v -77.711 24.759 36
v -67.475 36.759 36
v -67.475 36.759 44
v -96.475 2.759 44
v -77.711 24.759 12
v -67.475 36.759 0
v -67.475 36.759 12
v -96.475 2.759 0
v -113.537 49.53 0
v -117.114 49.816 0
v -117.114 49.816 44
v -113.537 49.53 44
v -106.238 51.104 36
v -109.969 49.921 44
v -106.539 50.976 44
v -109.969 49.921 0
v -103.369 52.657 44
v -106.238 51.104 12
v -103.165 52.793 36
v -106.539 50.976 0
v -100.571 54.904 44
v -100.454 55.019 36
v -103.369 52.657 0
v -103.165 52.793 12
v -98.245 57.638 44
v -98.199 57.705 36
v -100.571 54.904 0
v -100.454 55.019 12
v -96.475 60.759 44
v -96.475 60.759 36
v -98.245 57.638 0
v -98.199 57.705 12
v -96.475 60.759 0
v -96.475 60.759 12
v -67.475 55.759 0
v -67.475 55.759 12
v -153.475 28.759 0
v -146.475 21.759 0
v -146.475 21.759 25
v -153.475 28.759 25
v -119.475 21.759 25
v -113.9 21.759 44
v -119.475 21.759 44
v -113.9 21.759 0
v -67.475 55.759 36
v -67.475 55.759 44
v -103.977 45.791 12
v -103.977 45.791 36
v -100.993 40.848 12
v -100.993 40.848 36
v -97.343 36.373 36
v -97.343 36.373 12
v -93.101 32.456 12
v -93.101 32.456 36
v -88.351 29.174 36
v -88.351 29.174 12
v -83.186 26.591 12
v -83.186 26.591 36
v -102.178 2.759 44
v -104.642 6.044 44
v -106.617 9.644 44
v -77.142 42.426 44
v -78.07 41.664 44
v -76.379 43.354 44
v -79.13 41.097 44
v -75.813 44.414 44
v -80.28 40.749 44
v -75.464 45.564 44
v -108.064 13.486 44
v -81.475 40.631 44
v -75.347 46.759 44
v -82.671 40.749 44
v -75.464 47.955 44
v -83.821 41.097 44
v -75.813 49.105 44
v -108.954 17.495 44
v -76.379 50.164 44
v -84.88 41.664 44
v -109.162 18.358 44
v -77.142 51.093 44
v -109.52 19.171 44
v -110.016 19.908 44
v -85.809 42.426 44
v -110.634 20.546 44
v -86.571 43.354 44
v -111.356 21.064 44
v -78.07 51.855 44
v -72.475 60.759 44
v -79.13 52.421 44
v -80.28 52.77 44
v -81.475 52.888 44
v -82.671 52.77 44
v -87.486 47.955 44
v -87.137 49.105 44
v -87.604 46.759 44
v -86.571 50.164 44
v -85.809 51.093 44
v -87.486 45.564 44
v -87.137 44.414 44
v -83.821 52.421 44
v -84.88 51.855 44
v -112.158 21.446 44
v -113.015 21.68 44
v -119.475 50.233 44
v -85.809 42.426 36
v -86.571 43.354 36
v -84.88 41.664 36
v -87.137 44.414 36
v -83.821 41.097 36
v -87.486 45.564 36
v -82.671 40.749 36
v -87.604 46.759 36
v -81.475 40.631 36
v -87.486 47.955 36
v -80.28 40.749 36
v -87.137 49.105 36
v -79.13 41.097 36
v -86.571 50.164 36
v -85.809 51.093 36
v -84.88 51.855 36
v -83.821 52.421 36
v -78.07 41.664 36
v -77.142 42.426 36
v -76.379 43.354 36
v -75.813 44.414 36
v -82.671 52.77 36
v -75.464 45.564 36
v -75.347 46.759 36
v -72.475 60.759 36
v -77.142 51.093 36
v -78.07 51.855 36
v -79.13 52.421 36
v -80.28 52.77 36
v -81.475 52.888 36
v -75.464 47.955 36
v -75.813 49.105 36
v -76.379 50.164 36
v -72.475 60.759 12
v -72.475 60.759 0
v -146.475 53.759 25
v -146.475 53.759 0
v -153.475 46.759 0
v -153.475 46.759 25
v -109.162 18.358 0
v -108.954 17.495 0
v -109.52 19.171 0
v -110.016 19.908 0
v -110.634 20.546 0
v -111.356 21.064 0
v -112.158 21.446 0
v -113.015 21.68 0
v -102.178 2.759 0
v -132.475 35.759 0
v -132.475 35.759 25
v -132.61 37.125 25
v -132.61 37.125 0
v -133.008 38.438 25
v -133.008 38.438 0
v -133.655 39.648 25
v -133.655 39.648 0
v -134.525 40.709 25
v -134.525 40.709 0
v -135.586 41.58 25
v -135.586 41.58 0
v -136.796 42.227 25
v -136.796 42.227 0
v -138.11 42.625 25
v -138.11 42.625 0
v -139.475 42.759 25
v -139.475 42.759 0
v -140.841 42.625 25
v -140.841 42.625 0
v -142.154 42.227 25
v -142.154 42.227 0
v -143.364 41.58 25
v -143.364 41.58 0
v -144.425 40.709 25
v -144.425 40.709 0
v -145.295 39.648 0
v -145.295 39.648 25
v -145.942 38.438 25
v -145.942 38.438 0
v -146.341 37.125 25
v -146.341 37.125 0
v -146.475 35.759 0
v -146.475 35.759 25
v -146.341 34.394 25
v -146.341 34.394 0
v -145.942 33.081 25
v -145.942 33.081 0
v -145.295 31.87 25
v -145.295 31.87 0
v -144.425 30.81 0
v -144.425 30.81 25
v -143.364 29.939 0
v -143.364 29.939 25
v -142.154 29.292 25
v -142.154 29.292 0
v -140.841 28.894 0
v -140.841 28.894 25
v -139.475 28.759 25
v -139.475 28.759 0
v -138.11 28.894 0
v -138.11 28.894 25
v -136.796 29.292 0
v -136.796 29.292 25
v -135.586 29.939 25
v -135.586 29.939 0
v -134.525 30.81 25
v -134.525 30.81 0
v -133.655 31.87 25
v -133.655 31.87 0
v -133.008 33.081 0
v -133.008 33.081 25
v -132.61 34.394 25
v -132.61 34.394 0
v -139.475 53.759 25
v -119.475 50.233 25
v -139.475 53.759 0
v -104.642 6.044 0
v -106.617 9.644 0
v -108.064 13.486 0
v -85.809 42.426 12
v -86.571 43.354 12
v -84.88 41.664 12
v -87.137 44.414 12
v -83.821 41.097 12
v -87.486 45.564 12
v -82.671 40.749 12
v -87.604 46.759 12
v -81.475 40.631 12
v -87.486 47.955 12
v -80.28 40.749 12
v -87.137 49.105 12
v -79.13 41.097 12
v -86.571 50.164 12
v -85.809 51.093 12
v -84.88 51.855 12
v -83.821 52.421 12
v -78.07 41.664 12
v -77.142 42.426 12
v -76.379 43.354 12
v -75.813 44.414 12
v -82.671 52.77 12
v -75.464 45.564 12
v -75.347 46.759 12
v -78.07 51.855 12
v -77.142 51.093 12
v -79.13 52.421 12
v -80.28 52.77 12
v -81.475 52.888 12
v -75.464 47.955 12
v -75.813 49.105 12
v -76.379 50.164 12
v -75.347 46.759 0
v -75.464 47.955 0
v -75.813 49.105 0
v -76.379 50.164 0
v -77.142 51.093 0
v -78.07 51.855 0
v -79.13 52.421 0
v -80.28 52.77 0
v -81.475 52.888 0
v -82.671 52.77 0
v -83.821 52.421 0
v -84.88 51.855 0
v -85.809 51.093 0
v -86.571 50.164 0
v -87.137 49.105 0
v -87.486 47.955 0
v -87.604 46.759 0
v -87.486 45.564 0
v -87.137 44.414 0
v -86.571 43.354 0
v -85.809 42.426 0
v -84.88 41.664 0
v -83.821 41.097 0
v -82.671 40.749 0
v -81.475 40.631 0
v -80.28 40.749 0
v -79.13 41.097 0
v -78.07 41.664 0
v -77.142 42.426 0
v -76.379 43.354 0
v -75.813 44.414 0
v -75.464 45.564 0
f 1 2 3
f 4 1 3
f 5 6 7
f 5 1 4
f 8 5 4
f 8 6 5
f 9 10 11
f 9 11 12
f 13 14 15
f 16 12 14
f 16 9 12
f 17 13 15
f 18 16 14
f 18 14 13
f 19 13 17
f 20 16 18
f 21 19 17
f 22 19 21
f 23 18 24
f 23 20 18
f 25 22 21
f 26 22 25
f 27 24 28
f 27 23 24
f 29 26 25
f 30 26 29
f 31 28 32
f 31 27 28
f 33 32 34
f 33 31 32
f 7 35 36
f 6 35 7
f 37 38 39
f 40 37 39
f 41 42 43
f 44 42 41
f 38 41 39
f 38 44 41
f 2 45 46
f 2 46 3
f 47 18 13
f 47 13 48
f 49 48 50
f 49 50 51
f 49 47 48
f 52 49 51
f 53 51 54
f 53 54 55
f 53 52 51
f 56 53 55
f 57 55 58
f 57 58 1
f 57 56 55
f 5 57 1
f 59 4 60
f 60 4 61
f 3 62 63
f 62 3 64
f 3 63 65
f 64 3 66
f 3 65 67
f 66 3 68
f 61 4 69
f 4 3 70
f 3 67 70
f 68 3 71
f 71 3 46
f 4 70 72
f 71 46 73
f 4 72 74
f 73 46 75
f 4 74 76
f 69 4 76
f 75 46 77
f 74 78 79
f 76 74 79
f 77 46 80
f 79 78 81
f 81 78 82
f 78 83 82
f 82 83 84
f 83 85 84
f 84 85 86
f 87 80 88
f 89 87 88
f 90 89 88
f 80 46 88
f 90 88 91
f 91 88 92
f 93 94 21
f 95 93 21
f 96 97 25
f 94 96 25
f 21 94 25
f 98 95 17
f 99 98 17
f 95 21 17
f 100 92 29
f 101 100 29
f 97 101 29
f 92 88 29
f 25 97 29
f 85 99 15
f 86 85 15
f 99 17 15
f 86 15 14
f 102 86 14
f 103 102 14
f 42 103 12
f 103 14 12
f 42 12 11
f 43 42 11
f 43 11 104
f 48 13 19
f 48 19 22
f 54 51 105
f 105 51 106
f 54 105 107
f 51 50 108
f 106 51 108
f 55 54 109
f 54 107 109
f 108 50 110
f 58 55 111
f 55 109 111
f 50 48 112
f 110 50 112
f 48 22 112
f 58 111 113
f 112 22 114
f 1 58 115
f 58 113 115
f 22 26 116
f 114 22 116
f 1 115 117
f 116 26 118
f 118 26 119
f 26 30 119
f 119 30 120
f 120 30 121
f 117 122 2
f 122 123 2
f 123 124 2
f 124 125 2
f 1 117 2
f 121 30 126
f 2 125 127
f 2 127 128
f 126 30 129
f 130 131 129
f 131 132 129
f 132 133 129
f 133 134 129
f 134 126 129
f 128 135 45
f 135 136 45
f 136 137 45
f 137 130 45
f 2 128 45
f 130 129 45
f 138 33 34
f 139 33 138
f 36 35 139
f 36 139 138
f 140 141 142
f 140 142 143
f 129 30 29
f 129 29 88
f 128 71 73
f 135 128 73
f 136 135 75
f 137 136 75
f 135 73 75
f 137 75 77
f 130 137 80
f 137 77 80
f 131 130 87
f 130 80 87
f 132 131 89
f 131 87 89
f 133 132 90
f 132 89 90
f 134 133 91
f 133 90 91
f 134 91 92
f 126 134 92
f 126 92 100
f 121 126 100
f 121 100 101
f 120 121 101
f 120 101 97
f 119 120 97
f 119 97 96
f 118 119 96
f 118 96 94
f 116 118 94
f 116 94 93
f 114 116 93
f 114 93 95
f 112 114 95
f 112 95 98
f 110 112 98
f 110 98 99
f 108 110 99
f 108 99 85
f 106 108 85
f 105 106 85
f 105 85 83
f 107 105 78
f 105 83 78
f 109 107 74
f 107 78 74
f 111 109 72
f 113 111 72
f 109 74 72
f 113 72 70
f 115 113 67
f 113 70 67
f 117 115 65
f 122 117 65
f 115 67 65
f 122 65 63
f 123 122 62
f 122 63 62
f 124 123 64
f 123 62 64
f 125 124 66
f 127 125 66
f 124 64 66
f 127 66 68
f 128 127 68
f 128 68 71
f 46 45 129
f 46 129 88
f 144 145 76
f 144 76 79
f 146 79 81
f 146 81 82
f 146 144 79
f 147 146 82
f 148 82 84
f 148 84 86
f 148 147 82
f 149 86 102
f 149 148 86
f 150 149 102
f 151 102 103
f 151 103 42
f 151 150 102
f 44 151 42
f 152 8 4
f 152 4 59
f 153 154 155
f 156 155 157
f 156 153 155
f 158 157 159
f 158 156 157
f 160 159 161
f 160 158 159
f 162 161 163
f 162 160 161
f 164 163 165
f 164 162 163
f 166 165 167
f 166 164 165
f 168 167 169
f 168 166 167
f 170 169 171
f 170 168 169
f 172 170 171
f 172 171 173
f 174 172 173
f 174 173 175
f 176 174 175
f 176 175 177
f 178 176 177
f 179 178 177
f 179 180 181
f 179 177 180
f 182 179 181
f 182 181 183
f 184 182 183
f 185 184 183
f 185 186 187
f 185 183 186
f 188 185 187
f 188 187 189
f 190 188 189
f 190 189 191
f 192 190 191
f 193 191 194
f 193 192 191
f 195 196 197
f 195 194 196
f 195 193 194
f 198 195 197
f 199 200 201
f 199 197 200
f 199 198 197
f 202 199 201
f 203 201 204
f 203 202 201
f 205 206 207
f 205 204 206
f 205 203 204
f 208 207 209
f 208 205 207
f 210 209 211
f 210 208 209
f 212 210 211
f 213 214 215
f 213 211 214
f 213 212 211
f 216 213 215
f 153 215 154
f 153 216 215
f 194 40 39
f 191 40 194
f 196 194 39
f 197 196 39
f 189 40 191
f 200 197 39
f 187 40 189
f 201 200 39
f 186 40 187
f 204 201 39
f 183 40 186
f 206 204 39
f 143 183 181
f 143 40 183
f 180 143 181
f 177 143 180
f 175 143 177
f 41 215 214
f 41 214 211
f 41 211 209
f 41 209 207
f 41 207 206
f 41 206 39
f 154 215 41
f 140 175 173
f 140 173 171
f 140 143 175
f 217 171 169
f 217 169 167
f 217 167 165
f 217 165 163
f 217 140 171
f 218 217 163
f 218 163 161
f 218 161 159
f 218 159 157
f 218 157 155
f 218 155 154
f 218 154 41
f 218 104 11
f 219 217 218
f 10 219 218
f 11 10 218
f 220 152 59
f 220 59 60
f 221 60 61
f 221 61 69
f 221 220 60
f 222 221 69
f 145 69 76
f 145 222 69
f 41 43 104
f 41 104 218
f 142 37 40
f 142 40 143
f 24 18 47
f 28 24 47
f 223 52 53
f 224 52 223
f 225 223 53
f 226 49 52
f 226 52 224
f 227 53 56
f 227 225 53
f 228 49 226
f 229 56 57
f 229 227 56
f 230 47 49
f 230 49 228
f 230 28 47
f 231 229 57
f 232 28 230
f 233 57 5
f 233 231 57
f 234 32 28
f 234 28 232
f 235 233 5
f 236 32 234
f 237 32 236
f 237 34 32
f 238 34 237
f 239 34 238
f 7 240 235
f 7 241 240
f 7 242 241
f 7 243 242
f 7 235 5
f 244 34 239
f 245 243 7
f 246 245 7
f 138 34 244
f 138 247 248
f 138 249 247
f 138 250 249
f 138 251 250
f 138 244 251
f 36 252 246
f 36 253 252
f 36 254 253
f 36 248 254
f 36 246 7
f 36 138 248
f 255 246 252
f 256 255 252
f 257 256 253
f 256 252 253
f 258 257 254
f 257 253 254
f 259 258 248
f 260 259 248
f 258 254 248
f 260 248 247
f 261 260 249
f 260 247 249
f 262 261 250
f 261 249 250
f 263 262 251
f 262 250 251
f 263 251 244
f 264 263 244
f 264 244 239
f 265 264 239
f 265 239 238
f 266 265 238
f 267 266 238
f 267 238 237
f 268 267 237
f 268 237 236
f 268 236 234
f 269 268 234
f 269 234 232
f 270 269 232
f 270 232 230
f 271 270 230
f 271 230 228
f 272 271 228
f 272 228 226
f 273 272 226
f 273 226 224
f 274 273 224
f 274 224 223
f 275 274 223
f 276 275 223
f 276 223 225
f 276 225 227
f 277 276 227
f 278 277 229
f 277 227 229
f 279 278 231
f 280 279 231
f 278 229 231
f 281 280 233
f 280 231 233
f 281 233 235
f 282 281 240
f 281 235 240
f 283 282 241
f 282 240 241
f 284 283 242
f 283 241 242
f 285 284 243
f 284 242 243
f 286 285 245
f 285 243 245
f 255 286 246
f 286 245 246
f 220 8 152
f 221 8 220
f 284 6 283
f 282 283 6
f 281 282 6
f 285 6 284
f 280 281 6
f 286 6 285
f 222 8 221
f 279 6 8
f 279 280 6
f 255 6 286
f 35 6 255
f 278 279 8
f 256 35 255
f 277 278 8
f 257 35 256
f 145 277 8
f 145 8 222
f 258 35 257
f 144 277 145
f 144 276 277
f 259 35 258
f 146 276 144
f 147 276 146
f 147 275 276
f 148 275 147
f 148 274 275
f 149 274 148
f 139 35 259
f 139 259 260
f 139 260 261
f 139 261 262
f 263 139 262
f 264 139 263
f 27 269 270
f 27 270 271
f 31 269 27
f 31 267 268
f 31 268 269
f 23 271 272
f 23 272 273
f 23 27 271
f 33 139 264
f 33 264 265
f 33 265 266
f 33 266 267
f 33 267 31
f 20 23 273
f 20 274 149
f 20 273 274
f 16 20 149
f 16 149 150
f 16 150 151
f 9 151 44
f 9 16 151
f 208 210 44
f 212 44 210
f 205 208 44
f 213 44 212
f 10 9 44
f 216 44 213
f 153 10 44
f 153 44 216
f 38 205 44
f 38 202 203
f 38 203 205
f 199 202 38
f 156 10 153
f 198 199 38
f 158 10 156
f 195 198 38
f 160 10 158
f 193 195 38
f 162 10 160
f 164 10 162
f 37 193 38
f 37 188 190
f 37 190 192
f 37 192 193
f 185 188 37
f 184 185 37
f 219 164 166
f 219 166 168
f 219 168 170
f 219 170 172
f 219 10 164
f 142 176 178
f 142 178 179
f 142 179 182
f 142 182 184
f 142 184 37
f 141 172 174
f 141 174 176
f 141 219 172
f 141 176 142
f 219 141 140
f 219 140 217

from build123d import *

# Parameters (mm, degrees)
BOSS_EXTRUDE1_DEPTH = 44
SKETCH5_R           = 7
CUT_EXTRUDE1_DEPTH  = 171.828393793
CHAMFER1_SIZE       = 7
CHAMFER2_SIZE       = 7
CHAMFER3_SIZE       = 5
SKETCH8_R           = 6.128605104
CUT_EXTRUDE2_DEPTH  = 171.828393793
SKETCH9_W           = 34
SKETCH9_H           = 19
CUT_EXTRUDE3_DEPTH  = 168.605610181
CUT_EXTRUDE4_START  = -12
CUT_EXTRUDE4_DEPTH  = 24


with BuildPart() as part:
    # Sketch4 → Boss-Extrude1 (new body)
    with BuildSketch(Plane.XY):
        with BuildLine():
            Line((-153.475211562, 21.759357812), (-153.475211562, 53.759357812))
            Line((-153.475211562, 53.759357812), (-139.475211562, 53.759357812))
            Line((-139.475211562, 53.759357812), (-117.113830726, 49.816443045))
            ThreePointArc((-117.113830726, 49.816443045), (-104.914112856, 51.741401954), (-96.475211562, 60.759357812))
            Line((-96.475211562, 60.759357812), (-67.475211562, 60.759357812))
            Line((-67.475211562, 60.759357812), (-67.475211562, 36.759357812))
            Line((-67.475211562, 36.759357812), (-96.475211562, 2.759357812))
            Line((-96.475211562, 2.759357812), (-102.178231509, 2.759357812))
            ThreePointArc((-102.178231509, 2.759357812), (-106.617203706, 9.643685751), (-108.954033909, 17.49465193))
            ThreePointArc((-108.954033909, 17.49465193), (-110.63443687, 20.545944044), (-113.899672651, 21.759357812))
            Line((-113.899672651, 21.759357812), (-153.475211562, 21.759357812))
        make_face()
    extrude(amount=BOSS_EXTRUDE1_DEPTH)

    # Sketch5 → Cut-Extrude1 (cut, through all)
    with BuildSketch(Plane.XY):
        with Locations((-139.475211562, 35.759357812)):
            Circle(SKETCH5_R)
    extrude(amount=CUT_EXTRUDE1_DEPTH, mode=Mode.SUBTRACT)

    # Chamfer1
    chamfer1_edges = [part.edges().sort_by_distance(p)[0] for p in [
        (-153.475211562, 53.759357812, 22),
    ]]
    chamfer(chamfer1_edges, length=CHAMFER1_SIZE)

    # Chamfer2
    chamfer2_edges = [part.edges().sort_by_distance(p)[0] for p in [
        (-153.475211562, 21.759357812, 22),
    ]]
    chamfer(chamfer2_edges, length=CHAMFER2_SIZE)

    # Chamfer3
    chamfer3_edges = [part.edges().sort_by_distance(p)[0] for p in [
        (-67.475211562, 60.759357812, 22),
    ]]
    chamfer(chamfer3_edges, length=CHAMFER3_SIZE)

    # Sketch8 → Cut-Extrude2 (cut, through all)
    with BuildSketch(Plane.XY.offset(44)):
        with Locations((-81.475211562, 46.759357812)):
            Circle(SKETCH8_R)
    extrude(amount=-CUT_EXTRUDE2_DEPTH, mode=Mode.SUBTRACT)

    # Sketch9 → Cut-Extrude3 (cut, through all)
    with BuildSketch(Plane(origin=(0, 53.759357812, 0), x_dir=(1, 0, 0), z_dir=(0, 1, 0))):
        with Locations((-136.475211562, -34.5)):
            Rectangle(SKETCH9_W, SKETCH9_H)
    extrude(amount=-CUT_EXTRUDE3_DEPTH, mode=Mode.SUBTRACT)

    # Sketch10 → Cut-Extrude4 (cut)
    with BuildSketch(Plane(origin=(0, 0, 0), x_dir=(-1, 0, 0), z_dir=(0, 0, -1)).offset(CUT_EXTRUDE4_START)):
        with BuildLine():
            Line((77.71050568, 24.759357812), (67.475211562, 36.759357812))
            Line((67.475211562, 36.759357812), (67.475211562, 55.759357812))
            Line((67.475211562, 55.759357812), (72.475211562, 60.759357812))
            Line((72.475211562, 60.759357812), (96.475211562, 60.759357812))
            ThreePointArc((96.475211562, 60.759357812), (100.453967219, 55.018691433), (106.238275013, 51.103652429))
            ThreePointArc((106.238275013, 51.103652429), (95.290948579, 34.340063041), (77.71050568, 24.759357812))
        make_face()
    extrude(amount=-CUT_EXTRUDE4_DEPTH, mode=Mode.SUBTRACT)


solid = part.part
